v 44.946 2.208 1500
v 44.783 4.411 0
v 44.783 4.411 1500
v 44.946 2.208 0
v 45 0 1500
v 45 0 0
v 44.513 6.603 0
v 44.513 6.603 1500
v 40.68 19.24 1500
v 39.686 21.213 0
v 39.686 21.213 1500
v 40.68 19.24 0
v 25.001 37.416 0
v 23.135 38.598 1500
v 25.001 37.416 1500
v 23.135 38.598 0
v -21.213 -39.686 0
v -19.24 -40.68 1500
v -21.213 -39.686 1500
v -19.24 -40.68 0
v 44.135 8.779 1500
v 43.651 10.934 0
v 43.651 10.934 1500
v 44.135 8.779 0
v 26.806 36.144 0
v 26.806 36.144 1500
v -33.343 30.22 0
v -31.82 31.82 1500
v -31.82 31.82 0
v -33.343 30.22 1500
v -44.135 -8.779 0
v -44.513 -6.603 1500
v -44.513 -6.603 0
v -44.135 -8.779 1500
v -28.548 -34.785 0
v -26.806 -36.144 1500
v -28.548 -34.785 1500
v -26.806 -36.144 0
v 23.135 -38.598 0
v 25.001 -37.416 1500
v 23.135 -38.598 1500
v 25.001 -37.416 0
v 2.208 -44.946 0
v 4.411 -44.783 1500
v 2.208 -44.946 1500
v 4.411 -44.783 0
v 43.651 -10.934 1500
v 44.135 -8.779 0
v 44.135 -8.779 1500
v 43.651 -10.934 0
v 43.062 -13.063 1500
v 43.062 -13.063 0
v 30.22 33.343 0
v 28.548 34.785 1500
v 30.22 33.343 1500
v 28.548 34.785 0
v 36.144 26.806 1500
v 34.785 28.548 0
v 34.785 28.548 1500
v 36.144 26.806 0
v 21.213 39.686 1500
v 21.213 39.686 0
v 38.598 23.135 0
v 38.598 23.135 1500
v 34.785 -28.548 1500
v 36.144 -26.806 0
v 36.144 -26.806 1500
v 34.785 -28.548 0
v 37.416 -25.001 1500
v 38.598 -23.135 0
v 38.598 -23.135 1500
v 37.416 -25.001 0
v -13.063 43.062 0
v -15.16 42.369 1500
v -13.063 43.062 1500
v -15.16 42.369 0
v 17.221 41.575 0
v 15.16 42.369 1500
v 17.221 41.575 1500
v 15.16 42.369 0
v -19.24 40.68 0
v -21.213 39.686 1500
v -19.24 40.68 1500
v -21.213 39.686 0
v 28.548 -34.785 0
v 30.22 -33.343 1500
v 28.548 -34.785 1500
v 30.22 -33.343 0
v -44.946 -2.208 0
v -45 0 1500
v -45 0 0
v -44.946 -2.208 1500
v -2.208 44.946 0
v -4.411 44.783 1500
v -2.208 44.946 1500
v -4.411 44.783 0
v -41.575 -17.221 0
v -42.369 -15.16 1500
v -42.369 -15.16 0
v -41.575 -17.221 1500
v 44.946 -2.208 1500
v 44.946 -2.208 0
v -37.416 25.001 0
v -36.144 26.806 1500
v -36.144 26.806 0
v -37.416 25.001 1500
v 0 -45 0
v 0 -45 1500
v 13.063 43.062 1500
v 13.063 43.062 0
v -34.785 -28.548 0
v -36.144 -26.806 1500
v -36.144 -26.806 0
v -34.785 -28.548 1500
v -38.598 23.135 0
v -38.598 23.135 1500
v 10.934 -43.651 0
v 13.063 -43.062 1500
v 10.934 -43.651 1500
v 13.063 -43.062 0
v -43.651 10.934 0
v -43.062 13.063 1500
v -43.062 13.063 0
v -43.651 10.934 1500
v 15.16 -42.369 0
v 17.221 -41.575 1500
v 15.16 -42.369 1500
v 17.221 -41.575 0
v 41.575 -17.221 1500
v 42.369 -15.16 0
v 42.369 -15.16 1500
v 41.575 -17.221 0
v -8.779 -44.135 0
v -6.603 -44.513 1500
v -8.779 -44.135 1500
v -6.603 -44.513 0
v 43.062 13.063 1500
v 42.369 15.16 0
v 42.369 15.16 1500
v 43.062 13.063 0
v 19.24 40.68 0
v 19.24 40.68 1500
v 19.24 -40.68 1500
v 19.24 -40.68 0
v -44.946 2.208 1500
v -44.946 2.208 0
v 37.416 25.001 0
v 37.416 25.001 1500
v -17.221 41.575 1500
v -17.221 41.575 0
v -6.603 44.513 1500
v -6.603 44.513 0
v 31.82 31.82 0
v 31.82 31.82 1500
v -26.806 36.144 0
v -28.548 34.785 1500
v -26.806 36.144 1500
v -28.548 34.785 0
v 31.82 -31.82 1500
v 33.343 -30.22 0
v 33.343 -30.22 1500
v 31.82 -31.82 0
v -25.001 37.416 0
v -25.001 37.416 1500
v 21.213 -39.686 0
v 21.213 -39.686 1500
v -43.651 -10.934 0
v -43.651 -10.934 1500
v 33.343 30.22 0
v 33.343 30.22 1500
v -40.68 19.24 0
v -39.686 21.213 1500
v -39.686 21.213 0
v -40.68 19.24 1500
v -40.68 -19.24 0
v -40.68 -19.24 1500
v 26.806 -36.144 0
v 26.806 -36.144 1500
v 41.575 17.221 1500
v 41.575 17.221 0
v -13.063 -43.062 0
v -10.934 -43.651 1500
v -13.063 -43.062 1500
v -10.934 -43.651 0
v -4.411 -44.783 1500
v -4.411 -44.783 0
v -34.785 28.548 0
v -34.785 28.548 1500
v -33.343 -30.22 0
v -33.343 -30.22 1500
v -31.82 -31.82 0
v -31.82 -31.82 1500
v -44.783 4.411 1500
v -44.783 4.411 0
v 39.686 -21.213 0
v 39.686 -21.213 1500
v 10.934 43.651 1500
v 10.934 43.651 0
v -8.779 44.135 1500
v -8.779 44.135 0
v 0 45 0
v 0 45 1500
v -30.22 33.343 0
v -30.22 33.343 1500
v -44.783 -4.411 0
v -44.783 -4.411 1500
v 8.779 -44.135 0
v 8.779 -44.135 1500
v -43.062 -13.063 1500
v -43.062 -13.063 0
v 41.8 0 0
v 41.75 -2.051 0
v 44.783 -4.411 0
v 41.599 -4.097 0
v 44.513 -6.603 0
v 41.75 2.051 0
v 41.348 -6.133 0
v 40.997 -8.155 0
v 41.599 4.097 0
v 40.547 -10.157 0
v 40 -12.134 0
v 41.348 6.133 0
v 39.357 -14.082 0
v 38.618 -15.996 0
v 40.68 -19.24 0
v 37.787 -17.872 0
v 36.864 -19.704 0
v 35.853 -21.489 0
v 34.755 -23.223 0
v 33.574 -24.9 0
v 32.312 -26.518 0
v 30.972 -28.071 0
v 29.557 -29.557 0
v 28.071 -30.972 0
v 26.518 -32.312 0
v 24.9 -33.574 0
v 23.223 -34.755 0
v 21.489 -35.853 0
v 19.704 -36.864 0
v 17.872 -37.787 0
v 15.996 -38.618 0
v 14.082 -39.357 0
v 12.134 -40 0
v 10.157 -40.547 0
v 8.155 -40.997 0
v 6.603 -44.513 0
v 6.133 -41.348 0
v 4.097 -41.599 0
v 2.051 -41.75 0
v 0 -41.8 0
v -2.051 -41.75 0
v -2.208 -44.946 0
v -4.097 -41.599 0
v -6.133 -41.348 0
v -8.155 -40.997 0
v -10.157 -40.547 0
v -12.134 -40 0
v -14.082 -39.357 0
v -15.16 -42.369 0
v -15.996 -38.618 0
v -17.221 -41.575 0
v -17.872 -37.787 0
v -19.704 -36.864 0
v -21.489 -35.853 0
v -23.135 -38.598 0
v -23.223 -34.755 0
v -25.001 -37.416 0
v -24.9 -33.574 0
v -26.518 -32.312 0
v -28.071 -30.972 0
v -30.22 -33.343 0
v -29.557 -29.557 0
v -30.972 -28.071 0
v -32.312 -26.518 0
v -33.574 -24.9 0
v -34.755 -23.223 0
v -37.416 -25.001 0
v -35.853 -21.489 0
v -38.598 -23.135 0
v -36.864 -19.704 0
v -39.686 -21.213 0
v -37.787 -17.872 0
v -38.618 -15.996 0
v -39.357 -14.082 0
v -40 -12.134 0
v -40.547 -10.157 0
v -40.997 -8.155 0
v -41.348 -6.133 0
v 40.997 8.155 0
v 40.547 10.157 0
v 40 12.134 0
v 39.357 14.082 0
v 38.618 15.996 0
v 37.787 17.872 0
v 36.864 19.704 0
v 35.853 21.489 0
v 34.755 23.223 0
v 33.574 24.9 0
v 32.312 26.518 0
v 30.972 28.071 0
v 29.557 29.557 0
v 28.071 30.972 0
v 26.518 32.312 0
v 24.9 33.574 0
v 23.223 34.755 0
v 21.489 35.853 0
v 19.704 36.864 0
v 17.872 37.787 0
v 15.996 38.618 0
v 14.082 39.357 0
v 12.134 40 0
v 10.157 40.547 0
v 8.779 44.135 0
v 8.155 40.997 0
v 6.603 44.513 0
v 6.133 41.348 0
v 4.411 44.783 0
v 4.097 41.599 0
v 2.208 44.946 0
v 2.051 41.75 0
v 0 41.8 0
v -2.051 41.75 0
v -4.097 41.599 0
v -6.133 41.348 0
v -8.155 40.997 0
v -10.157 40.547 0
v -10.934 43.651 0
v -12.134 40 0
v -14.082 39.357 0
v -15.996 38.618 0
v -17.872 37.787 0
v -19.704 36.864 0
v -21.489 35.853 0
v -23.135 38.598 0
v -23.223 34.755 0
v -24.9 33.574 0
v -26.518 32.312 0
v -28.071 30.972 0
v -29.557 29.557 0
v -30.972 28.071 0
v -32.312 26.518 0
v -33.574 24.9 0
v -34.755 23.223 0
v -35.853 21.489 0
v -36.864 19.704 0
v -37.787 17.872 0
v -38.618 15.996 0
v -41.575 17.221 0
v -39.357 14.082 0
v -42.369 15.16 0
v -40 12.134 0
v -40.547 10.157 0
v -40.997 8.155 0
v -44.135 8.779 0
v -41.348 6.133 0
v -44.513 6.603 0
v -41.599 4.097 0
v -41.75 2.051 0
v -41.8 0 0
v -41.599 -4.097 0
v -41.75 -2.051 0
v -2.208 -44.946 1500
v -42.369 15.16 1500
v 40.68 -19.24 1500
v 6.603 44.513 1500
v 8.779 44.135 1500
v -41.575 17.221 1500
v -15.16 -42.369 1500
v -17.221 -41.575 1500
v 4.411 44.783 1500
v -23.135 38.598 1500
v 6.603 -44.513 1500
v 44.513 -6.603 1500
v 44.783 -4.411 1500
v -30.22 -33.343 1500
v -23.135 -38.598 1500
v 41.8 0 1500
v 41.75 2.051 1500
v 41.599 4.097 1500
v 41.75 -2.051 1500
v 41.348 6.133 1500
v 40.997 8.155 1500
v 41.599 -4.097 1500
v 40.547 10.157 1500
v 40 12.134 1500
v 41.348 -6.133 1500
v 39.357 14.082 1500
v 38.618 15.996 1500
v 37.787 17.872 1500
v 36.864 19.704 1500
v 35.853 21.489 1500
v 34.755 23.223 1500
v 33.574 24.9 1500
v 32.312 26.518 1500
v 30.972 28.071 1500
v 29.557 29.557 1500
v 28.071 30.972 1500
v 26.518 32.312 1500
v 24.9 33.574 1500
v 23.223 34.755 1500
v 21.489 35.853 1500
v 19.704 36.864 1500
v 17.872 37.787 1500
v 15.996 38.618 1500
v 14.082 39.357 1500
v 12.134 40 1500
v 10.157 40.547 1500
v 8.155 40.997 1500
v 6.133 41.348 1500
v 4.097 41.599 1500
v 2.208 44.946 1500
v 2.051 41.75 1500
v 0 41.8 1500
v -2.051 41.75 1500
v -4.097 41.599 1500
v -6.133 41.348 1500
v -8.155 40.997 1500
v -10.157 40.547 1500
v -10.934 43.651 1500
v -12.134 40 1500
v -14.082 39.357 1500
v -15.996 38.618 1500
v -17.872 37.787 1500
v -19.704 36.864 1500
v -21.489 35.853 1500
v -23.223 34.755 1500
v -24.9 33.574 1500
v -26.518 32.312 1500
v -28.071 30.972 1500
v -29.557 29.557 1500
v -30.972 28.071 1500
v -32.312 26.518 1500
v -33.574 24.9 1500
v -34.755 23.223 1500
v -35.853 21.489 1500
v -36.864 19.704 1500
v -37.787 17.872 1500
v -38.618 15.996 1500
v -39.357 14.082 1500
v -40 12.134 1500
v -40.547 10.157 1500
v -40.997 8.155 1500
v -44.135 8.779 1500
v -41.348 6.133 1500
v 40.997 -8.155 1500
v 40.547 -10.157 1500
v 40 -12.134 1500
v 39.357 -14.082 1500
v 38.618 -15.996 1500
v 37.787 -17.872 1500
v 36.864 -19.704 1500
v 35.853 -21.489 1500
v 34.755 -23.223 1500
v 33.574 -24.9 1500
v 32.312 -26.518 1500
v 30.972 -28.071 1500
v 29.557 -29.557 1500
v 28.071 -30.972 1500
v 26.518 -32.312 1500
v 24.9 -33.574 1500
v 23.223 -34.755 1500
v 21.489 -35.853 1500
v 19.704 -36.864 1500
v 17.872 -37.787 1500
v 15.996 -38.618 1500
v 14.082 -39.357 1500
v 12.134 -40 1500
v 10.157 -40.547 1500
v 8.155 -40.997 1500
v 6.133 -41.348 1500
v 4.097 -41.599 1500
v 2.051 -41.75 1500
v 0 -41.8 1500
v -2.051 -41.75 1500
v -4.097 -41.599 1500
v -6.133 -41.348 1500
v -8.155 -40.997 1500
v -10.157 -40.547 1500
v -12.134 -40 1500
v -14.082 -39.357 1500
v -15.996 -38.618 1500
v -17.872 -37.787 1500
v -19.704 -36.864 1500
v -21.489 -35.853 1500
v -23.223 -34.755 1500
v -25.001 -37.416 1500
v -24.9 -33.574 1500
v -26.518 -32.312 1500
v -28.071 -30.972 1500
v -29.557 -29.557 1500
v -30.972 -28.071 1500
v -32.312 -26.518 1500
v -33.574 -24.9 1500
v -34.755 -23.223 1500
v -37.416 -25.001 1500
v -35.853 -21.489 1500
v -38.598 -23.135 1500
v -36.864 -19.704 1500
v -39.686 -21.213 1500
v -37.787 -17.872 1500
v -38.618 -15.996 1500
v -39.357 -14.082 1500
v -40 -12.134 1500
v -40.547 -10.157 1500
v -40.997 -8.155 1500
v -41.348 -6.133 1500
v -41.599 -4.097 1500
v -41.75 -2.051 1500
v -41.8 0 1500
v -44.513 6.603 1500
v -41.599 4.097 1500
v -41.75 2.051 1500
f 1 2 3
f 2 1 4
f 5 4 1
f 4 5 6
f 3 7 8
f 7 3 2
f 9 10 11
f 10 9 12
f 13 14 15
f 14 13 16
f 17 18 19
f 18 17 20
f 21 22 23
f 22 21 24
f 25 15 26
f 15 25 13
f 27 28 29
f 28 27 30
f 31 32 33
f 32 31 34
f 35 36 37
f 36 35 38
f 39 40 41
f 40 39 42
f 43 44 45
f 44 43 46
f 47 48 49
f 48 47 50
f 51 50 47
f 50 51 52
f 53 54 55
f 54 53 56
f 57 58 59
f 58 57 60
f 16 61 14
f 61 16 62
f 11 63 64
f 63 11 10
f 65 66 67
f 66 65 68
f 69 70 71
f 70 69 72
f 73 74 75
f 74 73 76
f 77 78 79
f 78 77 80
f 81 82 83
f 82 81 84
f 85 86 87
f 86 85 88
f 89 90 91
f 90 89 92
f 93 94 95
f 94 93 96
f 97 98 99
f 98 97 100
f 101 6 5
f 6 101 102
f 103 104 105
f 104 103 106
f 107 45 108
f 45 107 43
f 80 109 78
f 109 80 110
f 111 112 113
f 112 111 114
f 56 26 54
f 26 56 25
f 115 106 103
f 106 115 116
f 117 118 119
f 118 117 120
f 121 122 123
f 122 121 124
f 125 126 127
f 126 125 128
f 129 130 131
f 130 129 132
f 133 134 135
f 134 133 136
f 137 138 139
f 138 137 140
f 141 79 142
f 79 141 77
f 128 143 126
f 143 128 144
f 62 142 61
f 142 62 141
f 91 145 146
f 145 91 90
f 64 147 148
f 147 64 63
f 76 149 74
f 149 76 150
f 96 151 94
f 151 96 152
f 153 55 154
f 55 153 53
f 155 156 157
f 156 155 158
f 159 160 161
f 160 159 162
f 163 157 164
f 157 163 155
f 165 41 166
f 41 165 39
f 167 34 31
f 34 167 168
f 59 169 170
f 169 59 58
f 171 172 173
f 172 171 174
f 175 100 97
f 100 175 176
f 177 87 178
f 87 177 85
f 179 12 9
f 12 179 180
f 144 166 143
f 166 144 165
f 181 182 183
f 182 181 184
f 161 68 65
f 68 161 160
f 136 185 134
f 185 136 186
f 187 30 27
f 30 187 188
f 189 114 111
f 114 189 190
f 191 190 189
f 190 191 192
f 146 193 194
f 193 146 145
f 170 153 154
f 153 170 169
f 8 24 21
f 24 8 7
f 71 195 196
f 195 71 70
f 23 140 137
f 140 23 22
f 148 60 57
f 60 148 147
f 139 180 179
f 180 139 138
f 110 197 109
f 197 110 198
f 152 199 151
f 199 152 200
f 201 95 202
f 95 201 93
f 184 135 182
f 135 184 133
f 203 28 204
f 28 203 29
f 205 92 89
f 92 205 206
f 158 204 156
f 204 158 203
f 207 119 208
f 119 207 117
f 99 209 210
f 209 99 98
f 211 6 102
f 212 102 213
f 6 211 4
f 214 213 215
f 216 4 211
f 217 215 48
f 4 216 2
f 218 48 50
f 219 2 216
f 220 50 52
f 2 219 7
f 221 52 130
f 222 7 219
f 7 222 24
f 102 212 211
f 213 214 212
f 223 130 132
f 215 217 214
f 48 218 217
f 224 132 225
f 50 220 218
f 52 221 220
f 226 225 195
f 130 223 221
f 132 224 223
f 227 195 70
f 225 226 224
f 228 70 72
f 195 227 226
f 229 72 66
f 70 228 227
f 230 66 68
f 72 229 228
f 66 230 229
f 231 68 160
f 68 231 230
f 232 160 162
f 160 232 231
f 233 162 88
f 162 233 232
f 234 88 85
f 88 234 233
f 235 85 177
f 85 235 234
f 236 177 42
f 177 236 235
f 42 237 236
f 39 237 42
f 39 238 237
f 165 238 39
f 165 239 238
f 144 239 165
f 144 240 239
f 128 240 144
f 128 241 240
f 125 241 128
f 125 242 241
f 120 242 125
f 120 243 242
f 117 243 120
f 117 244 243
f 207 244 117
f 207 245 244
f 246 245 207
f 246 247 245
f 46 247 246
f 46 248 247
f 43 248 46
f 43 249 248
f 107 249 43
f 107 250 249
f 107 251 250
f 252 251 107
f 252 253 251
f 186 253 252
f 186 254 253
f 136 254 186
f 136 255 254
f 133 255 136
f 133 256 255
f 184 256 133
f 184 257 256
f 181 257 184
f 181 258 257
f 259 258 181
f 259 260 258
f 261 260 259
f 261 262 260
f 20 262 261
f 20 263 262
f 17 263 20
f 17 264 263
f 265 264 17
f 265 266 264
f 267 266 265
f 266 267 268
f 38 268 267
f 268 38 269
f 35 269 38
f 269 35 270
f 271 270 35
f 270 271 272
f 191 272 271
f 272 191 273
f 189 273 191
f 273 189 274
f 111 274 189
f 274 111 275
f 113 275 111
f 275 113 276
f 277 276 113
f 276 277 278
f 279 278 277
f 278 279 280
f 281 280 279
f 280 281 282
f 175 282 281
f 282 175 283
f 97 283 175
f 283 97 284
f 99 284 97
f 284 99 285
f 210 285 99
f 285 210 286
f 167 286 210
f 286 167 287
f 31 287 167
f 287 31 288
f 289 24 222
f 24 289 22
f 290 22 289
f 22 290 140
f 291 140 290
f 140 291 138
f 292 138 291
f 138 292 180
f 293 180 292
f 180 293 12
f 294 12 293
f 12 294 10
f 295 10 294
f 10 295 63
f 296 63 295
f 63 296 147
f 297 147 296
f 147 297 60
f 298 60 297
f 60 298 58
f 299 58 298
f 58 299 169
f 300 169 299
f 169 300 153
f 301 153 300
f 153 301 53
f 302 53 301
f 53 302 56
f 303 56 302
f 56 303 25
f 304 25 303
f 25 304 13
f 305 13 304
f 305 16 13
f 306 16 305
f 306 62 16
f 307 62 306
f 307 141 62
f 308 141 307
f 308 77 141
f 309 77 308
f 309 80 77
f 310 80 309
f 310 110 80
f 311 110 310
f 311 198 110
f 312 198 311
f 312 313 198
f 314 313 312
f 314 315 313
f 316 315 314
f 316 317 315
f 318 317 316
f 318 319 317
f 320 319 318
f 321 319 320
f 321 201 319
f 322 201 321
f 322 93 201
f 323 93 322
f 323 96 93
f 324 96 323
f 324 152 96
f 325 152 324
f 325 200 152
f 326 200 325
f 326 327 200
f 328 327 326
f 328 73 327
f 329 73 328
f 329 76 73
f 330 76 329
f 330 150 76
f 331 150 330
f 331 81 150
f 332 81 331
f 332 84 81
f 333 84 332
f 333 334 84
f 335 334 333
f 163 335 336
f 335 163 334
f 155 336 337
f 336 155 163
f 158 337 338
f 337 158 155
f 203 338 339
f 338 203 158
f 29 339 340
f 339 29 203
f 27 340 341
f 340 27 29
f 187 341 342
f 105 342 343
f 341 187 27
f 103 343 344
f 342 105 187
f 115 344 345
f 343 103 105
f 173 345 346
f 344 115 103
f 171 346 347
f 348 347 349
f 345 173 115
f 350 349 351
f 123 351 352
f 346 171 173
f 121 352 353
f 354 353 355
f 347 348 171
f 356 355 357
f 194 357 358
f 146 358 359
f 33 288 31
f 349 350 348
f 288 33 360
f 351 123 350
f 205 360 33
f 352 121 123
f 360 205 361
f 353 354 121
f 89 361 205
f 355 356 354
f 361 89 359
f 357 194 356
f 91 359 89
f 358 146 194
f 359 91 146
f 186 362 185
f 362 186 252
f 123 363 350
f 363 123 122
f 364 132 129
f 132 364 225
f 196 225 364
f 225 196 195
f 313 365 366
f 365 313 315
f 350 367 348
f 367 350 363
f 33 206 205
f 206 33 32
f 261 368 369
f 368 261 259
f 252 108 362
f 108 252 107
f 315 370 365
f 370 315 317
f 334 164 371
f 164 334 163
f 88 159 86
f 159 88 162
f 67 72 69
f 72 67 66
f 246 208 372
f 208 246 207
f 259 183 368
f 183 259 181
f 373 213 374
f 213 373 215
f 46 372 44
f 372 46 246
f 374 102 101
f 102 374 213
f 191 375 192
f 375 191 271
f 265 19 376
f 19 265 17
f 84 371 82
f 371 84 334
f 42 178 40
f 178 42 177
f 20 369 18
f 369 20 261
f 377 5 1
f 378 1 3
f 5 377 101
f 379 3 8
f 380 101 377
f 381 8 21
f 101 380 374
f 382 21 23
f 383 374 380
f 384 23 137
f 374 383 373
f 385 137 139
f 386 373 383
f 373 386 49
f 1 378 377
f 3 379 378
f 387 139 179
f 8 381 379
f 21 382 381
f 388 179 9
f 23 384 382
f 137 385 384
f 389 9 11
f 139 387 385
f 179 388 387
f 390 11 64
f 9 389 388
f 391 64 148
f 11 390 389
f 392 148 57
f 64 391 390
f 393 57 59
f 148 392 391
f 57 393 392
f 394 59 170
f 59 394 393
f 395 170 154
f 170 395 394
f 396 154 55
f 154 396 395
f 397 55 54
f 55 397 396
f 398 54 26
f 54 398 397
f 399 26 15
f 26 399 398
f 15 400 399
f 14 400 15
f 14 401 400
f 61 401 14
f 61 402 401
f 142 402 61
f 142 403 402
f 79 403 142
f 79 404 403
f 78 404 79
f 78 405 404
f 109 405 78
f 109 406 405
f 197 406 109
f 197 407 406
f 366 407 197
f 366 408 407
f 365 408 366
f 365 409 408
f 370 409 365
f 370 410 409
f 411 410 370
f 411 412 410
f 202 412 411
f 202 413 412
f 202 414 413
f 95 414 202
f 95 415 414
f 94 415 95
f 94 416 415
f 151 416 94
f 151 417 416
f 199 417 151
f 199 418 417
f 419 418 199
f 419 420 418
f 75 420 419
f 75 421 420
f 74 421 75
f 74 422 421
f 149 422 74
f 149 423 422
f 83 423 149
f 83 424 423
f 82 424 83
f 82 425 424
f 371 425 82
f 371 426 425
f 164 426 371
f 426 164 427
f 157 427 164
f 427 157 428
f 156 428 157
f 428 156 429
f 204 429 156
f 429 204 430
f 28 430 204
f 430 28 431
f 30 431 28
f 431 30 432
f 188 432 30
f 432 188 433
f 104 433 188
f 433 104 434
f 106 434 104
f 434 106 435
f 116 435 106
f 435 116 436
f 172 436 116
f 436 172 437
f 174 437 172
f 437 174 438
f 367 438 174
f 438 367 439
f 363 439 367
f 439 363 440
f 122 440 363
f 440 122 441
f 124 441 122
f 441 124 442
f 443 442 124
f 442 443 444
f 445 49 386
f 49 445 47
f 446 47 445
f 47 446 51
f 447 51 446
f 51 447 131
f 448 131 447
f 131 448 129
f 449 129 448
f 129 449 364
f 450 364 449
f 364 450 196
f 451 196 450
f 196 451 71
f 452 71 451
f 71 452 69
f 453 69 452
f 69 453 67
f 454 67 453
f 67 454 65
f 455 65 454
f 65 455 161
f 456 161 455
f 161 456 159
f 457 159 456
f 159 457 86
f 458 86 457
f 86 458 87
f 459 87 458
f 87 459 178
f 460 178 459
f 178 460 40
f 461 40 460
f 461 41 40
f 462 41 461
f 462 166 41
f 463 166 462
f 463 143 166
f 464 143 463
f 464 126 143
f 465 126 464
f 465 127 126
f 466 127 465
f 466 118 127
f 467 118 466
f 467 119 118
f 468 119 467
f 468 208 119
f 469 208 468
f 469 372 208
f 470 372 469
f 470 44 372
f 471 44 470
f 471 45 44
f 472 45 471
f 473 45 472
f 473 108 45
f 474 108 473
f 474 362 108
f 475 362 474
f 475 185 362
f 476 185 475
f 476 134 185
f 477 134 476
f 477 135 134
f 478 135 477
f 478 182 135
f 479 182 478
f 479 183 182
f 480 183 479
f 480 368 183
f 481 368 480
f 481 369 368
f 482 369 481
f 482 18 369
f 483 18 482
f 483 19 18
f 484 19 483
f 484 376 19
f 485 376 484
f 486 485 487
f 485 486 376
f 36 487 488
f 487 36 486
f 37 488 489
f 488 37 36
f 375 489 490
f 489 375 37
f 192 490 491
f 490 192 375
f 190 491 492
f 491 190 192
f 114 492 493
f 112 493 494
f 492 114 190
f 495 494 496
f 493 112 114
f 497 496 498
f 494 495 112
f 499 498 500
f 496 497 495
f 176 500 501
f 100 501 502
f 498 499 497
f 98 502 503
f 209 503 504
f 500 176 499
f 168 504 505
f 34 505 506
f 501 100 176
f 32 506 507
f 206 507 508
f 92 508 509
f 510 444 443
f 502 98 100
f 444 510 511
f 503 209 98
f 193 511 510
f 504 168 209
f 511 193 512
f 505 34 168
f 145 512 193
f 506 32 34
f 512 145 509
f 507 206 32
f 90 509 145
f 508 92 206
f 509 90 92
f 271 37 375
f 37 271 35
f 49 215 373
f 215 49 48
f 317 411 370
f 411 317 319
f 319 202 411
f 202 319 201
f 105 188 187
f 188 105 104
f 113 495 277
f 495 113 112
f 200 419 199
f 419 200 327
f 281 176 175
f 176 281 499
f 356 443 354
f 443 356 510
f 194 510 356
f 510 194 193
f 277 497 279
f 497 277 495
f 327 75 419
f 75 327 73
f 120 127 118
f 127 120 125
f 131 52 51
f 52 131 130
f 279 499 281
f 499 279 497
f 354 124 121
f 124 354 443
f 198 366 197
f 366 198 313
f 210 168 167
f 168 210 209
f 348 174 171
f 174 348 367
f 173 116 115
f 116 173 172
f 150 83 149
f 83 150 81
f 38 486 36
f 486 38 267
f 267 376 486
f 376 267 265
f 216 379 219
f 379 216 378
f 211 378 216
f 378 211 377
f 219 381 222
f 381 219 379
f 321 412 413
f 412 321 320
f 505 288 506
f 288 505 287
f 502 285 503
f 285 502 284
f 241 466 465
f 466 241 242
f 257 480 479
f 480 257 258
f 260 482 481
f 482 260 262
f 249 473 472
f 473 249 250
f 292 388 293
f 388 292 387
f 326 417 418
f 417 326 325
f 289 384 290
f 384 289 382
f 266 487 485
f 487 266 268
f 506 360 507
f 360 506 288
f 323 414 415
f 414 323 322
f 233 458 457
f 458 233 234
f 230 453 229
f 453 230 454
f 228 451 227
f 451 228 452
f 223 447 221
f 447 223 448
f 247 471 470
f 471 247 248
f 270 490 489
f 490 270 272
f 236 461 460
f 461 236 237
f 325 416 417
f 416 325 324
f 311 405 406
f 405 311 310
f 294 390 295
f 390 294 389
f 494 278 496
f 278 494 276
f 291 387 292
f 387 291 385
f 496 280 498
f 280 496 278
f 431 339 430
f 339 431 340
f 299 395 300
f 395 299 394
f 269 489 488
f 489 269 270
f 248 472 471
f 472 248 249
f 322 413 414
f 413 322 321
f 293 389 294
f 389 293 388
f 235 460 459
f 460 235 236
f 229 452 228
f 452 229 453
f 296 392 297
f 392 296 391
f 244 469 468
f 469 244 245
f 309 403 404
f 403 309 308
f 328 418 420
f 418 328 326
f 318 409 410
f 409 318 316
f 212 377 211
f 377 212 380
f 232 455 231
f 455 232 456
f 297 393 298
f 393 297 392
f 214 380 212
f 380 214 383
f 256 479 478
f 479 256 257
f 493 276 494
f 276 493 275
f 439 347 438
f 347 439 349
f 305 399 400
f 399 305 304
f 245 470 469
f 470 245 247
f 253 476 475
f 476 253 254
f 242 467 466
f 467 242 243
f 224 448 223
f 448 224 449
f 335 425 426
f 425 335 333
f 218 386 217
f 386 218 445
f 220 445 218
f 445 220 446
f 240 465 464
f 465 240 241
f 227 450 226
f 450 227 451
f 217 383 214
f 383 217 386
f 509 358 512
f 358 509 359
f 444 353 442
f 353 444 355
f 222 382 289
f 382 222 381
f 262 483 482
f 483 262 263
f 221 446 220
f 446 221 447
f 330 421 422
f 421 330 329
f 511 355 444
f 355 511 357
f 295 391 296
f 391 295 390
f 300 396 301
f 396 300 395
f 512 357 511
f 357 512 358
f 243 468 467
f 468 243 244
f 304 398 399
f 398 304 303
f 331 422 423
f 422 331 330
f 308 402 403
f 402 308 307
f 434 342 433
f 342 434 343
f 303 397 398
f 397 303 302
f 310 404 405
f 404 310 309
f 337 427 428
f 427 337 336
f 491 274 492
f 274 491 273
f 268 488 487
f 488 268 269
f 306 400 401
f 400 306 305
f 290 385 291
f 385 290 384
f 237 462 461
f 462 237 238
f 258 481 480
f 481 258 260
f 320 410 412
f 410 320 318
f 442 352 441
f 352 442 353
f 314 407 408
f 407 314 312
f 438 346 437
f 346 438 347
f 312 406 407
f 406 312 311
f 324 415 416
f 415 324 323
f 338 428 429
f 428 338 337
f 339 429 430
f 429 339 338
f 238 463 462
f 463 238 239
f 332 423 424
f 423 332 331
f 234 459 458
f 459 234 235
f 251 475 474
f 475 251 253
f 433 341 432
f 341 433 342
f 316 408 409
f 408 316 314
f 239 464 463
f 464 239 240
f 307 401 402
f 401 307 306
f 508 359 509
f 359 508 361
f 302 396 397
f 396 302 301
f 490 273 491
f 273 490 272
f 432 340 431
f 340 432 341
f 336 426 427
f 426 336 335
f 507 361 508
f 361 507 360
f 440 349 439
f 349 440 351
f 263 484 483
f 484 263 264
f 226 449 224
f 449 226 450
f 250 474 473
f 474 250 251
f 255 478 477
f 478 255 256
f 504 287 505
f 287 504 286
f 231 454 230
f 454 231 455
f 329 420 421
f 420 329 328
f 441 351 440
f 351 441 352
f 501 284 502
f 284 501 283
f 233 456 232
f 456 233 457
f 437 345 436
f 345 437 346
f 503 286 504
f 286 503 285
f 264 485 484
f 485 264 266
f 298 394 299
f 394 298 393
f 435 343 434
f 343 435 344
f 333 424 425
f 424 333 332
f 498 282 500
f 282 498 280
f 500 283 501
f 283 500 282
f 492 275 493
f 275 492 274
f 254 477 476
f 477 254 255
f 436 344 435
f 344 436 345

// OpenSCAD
$fn = 128;

// HT 90 pipe 1500 mm (assumed: 90 mm outer diameter, 1500 mm length)
// Typical HT (house drainage) pipe wall thickness varies; choose a reasonable default.
pipe_length = 1500;      // mm
outer_diameter = 90;     // mm
wall_thickness = 3.2;    // mm (adjust if needed)

inner_diameter = outer_diameter - 2*wall_thickness;

module ht_pipe(len, od, id) {
    difference() {
        cylinder(h = len, d = od, center = false);
        translate([0,0,-0.1])
            cylinder(h = len + 0.2, d = id, center = false);
    }
}

ht_pipe(pipe_length, outer_diameter, inner_diameter);
